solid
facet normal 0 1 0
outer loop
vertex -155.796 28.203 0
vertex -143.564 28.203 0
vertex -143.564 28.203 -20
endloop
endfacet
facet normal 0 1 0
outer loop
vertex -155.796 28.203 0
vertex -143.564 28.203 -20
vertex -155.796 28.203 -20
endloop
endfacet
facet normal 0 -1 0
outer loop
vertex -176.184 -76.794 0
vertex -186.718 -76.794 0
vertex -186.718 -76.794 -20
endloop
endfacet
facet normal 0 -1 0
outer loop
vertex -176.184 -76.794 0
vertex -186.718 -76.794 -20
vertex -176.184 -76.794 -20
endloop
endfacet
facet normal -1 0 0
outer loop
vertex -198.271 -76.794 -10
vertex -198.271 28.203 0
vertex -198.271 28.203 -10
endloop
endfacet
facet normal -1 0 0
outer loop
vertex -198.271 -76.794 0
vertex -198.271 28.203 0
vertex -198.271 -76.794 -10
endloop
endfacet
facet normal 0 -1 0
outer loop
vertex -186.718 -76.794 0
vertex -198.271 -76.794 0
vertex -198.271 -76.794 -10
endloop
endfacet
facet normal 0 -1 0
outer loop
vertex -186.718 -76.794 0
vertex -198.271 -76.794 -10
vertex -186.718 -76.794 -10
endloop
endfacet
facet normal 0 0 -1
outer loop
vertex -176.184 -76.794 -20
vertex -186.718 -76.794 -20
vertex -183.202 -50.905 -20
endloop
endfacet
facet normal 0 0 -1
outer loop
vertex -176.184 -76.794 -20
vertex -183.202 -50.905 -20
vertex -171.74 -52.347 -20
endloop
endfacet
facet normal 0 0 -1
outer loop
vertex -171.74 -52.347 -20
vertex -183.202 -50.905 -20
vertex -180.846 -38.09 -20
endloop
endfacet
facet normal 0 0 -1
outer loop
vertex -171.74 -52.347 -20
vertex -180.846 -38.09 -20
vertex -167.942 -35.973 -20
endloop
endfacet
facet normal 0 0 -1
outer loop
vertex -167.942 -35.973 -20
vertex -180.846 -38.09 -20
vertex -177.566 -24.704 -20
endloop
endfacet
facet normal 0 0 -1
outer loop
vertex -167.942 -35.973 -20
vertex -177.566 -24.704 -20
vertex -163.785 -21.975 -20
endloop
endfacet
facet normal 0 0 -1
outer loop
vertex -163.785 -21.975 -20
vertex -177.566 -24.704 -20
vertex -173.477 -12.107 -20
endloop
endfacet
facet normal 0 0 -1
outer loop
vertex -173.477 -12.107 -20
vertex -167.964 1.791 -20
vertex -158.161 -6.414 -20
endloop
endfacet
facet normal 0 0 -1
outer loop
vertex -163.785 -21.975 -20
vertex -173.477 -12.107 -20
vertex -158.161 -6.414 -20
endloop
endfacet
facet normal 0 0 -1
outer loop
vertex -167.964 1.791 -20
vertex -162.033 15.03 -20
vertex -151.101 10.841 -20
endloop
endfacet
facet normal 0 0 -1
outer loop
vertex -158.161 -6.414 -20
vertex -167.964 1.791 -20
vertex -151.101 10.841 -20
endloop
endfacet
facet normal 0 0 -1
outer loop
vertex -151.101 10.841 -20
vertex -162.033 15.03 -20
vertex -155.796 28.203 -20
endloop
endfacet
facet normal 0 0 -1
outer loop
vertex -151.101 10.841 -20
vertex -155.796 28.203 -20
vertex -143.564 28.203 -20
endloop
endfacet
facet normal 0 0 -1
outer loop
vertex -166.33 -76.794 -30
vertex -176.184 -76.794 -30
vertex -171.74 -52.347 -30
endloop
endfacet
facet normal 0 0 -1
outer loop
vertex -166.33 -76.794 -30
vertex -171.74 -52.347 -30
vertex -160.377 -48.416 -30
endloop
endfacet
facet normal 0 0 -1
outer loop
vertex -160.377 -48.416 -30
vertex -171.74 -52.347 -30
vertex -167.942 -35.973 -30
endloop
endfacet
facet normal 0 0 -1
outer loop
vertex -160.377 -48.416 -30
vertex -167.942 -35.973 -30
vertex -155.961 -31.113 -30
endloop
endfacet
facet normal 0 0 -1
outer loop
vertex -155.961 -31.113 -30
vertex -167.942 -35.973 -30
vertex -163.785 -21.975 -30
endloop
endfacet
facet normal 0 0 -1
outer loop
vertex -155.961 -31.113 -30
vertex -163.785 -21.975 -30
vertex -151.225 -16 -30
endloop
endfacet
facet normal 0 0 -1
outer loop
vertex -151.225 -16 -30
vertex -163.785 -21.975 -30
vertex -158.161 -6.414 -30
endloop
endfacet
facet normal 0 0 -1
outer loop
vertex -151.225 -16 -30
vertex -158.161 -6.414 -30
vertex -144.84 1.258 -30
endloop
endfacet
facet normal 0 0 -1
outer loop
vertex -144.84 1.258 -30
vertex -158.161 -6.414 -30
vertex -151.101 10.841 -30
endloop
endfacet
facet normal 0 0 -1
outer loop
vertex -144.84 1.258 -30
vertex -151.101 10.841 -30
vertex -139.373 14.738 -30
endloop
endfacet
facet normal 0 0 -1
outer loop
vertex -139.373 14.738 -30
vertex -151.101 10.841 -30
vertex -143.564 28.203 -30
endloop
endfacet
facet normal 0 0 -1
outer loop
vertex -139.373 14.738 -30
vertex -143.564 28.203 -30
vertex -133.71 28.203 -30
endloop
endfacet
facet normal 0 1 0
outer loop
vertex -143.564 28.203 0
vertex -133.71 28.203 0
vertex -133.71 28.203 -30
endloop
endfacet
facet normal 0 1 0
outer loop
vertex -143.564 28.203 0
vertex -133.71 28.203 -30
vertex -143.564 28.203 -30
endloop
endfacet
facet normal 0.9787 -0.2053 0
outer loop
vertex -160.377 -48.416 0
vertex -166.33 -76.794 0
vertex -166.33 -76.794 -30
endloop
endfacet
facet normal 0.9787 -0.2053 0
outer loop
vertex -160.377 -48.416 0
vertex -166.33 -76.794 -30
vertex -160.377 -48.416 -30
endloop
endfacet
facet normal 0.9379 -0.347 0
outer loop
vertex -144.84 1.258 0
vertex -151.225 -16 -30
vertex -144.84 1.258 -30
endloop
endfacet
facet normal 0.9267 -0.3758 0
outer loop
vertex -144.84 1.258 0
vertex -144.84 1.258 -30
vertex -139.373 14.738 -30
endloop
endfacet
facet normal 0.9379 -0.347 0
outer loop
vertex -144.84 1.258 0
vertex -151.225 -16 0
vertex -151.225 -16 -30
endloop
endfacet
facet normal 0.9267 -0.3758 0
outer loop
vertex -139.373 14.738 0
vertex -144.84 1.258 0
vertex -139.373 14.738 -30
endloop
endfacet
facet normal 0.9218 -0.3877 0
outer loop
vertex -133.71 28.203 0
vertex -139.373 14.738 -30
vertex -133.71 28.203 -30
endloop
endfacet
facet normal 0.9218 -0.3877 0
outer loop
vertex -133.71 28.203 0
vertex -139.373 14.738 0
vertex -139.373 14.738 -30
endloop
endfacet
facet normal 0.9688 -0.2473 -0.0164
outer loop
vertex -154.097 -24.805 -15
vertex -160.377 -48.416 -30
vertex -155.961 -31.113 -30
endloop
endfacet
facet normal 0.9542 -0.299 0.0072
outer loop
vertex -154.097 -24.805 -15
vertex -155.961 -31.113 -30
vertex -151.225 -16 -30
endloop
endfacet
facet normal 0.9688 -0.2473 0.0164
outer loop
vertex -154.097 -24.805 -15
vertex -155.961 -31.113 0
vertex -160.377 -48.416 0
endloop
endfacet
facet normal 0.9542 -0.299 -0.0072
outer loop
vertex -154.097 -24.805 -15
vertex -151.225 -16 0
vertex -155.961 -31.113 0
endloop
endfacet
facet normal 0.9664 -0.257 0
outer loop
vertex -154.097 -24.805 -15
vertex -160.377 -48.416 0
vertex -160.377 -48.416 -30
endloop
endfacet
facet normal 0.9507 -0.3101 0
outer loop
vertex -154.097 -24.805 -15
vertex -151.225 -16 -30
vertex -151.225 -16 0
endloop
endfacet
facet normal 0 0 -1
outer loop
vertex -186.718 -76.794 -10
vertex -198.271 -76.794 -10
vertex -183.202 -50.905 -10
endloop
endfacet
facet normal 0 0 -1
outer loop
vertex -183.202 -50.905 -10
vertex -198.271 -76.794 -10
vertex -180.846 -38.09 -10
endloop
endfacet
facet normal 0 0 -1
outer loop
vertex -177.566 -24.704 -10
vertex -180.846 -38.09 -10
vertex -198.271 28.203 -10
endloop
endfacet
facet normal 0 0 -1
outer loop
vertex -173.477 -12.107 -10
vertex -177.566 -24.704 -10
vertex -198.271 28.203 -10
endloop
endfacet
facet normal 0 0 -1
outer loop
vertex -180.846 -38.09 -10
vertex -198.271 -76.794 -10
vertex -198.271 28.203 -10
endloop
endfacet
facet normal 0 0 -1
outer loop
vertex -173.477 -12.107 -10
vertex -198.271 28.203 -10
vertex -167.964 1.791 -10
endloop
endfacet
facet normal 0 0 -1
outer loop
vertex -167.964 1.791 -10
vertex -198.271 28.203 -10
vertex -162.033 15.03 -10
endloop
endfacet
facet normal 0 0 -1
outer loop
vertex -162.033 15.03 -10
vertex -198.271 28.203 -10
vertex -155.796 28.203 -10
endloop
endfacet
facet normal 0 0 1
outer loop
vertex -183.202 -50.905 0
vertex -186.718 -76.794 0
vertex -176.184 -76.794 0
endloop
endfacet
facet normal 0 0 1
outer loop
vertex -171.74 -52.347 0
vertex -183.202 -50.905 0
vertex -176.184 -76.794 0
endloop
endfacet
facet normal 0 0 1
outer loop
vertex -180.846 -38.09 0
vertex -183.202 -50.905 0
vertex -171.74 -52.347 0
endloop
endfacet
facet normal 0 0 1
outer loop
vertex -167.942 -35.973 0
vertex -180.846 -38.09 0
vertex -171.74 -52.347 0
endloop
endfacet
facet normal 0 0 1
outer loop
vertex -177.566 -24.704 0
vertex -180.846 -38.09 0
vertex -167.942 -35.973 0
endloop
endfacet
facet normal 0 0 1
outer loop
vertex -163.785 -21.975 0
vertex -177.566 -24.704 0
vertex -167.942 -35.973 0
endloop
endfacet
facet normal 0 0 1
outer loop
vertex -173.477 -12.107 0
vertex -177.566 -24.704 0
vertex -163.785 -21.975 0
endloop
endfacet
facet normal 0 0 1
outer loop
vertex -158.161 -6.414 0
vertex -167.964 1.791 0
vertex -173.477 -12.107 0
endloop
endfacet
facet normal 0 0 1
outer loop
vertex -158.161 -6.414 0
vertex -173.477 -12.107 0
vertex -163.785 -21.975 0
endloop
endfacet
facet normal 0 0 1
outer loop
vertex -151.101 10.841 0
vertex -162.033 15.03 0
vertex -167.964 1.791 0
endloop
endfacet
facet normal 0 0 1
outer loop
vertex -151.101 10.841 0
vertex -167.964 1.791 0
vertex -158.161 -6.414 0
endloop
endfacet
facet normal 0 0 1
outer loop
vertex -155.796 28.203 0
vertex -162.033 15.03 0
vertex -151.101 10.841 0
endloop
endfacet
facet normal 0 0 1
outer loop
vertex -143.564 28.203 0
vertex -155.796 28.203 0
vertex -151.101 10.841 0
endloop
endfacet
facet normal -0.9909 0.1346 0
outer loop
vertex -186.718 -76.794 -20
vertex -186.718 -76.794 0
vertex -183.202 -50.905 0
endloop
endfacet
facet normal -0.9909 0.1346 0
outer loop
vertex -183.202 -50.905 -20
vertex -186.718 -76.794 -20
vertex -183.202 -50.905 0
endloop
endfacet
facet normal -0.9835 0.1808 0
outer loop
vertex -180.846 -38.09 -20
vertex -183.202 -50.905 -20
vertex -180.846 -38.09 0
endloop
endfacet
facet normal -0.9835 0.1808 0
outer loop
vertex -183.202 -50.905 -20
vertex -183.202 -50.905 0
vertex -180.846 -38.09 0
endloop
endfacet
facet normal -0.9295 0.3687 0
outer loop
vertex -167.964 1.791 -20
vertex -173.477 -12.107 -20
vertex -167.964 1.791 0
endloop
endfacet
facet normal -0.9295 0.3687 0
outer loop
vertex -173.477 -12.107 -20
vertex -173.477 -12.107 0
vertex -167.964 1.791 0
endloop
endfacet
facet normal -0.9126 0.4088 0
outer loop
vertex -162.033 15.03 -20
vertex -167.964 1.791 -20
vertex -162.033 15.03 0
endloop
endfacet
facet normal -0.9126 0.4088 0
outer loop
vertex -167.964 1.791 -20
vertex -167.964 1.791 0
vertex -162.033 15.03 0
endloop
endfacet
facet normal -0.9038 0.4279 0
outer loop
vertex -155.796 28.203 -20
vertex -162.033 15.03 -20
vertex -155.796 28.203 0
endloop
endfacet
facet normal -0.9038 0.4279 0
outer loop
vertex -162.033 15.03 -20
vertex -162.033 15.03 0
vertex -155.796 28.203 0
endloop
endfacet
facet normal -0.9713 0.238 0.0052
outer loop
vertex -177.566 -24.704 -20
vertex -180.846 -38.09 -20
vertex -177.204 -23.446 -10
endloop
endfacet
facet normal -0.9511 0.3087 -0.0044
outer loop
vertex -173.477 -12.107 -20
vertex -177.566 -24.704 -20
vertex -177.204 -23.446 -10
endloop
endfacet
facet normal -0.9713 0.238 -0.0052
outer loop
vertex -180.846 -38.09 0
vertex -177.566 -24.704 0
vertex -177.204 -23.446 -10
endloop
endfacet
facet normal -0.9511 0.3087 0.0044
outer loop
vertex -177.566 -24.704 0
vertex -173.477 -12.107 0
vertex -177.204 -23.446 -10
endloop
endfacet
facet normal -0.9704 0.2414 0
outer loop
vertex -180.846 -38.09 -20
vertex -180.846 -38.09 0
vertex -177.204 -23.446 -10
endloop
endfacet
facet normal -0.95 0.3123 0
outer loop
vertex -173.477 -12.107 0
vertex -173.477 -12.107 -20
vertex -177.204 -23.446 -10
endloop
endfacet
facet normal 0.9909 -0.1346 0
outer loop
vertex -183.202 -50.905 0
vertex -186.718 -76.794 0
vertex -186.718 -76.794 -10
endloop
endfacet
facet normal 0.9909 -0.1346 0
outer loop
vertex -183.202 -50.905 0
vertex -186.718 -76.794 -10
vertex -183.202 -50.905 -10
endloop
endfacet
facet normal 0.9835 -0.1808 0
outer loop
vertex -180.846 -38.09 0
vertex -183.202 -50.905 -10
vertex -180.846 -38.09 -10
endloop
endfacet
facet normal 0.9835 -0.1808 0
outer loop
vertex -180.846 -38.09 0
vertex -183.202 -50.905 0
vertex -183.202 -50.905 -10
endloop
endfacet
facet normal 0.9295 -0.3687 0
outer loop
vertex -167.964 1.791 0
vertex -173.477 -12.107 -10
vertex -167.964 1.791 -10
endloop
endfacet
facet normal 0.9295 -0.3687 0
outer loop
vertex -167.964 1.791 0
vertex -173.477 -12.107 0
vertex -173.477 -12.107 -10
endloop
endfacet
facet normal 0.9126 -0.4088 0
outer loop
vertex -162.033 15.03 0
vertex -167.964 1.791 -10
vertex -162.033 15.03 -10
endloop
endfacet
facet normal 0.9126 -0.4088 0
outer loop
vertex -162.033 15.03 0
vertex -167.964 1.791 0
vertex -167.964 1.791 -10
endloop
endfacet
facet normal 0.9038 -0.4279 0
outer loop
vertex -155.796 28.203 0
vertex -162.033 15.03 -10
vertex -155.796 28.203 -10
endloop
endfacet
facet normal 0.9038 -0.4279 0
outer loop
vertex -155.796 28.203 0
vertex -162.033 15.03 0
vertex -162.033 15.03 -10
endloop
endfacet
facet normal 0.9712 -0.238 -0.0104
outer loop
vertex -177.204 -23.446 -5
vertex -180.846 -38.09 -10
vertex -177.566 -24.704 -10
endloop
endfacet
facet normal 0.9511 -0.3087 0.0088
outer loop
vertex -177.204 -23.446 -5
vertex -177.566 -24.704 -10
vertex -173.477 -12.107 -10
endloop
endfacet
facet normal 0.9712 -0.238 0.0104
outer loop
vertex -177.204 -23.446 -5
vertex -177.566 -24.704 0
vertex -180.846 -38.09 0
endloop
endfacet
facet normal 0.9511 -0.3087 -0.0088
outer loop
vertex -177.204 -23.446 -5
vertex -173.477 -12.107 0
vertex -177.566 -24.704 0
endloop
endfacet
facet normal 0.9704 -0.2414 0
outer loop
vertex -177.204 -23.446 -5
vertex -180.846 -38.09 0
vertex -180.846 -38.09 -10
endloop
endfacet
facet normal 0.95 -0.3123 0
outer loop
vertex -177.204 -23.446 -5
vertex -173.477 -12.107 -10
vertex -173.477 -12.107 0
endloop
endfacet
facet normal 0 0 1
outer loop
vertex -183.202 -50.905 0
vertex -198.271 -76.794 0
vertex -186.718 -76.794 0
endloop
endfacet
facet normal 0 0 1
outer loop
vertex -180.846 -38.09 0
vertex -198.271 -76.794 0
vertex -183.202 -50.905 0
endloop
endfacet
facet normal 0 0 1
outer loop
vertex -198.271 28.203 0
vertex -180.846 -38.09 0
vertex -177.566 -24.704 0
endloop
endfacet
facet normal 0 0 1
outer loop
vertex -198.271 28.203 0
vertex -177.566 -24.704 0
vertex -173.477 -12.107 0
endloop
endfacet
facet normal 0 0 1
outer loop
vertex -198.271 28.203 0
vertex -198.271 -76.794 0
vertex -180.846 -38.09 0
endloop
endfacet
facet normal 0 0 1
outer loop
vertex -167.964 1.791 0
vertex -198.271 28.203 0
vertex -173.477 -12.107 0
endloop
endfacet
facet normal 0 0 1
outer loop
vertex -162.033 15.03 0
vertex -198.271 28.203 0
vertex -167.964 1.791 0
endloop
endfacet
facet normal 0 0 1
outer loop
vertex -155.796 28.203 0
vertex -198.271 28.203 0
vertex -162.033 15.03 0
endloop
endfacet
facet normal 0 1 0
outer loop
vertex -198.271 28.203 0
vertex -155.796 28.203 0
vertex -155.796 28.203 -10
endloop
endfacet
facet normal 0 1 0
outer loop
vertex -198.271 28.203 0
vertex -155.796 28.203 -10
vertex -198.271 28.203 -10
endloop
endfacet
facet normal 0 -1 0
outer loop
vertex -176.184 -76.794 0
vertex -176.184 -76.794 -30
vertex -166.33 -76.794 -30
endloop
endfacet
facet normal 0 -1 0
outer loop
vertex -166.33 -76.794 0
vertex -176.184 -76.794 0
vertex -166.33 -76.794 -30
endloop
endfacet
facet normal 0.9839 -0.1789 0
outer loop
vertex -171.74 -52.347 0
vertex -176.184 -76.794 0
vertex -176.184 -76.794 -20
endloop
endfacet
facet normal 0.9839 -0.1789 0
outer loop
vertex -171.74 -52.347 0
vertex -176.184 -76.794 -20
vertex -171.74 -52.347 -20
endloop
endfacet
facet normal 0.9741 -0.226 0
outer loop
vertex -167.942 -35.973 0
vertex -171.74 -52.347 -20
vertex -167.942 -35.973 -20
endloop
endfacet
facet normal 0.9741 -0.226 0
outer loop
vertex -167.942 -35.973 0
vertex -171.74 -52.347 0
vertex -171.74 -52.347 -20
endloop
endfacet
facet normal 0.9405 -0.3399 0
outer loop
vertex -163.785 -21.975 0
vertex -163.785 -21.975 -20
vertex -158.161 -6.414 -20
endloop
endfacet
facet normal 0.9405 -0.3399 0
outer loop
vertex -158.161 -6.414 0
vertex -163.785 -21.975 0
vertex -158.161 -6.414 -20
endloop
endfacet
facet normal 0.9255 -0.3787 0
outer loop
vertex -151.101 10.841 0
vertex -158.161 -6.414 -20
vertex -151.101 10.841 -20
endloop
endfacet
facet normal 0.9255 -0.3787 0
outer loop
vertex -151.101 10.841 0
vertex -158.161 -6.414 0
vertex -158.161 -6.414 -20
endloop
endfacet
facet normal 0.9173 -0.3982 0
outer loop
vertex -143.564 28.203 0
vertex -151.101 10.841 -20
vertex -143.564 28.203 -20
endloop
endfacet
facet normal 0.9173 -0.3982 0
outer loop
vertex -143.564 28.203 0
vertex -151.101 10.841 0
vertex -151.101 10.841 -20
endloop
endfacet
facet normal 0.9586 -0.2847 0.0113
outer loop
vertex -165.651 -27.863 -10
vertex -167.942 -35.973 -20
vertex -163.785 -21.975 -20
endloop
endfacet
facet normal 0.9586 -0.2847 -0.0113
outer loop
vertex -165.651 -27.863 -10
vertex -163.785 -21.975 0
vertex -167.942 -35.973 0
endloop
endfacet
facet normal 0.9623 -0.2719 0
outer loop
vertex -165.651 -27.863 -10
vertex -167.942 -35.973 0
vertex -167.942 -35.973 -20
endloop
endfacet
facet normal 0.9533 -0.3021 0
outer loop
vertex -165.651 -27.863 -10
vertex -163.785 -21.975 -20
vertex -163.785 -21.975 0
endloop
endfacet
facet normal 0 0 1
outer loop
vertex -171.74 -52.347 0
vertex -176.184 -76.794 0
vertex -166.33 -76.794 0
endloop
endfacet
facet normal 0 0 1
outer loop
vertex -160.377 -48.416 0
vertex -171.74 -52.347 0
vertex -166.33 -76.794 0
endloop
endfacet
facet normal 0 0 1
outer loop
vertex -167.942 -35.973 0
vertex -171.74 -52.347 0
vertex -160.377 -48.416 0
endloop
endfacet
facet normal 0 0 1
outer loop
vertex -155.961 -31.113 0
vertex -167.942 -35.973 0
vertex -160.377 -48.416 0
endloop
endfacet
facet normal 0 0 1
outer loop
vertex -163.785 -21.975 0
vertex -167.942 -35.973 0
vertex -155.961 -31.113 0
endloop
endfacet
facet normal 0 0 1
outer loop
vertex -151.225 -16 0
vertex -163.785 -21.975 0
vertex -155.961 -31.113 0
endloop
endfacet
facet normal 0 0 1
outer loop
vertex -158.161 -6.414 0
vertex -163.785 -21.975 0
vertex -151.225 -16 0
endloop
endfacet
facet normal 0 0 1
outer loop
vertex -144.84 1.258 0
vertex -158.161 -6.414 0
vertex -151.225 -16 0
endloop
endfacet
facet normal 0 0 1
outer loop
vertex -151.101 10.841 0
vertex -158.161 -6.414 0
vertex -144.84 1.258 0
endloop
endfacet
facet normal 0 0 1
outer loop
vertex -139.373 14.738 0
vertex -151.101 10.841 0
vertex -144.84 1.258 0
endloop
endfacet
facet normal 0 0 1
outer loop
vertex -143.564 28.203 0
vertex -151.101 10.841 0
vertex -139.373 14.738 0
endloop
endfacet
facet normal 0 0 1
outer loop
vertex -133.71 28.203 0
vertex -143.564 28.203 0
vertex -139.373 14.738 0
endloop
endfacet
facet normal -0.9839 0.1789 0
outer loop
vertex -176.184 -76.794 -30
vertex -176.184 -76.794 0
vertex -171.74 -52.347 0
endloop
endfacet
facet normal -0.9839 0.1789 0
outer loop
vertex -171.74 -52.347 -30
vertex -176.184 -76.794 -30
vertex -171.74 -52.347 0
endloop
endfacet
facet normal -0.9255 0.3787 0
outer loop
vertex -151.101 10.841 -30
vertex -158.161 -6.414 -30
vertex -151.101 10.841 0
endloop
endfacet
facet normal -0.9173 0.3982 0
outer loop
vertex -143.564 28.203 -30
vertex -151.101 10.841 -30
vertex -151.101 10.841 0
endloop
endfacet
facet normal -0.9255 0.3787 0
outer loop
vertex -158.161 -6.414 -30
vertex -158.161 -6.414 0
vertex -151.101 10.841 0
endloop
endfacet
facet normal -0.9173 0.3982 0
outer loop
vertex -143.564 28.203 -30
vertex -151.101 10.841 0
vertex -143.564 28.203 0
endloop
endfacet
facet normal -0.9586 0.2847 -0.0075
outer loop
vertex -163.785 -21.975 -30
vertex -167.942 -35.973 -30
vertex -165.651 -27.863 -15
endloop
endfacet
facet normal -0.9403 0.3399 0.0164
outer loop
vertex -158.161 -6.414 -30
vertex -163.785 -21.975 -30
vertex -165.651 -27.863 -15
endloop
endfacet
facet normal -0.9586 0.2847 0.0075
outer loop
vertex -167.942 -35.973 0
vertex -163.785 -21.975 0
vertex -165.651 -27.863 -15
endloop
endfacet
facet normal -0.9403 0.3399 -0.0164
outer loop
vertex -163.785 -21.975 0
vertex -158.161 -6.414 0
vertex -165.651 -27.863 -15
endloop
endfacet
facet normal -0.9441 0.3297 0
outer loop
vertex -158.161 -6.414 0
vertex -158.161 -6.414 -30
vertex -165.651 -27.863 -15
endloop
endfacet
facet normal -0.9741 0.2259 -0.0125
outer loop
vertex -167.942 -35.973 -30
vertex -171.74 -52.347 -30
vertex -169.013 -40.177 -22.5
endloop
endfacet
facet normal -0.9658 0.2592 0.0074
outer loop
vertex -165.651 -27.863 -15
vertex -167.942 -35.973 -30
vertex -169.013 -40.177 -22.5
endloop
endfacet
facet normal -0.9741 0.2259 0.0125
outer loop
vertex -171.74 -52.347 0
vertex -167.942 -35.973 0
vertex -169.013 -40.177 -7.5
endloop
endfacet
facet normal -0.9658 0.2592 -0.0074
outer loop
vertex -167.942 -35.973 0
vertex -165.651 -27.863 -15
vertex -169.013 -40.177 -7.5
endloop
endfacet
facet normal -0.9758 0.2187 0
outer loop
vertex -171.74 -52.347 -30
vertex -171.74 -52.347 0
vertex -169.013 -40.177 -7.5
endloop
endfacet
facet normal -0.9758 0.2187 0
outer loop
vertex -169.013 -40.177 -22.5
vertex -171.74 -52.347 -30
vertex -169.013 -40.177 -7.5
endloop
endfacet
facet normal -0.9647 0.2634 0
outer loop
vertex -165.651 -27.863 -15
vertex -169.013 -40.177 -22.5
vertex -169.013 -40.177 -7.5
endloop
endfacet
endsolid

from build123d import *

# Parameters (mm, degrees)
F1_DEPTH = 10
F2_DEPTH = 20
F3_DEPTH = 30


with BuildPart() as f1:
    # F0 (on Top) → F1 (new body)
    with BuildSketch(Plane.XY):
        with BuildLine():
            Line((-155.7964533567, 28.2030683011), (-198.2709467411, 28.2030683011))
            Line((-198.2709467411, 28.2030683011), (-198.2709467411, -76.7938867211))
            Line((-198.2709467411, -76.7938867211), (-186.7178976536, -76.7938867211))
            add(Edge.make_bspline(
                [(-186.7178976536, -76.7938867211), (-184.5023630807, -58.8045595065), (-180.0364101654, -22.5426616764), (-163.9184051264, 11.1999698777), (-155.7964533567, 28.2030683011)],
                knots=[0, 0, 0, 0, 0.4960944763, 1, 1, 1, 1], degree=3))
        make_face()
    extrude(amount=-F1_DEPTH)


with BuildPart() as f2:
    # F0 (on Top) → F2 (new body)
    with BuildSketch(Plane.XY):
        with BuildLine():
            Line((-143.5638070107, 28.2030683011), (-155.7964533567, 28.2030683011))
            add(Edge.make_bspline(
                [(-186.7178976536, -76.7938867211), (-184.5023630807, -58.8045595065), (-180.0364101654, -22.5426616764), (-163.9184051264, 11.1999698777), (-155.7964533567, 28.2030683011)],
                knots=[0, 0, 0, 0, 0.4960944763, 1, 1, 1, 1], degree=3))
            Line((-186.7178976536, -76.7938867211), (-176.184207201, -76.7938867211))
            add(Edge.make_bspline(
                [(-176.184207201, -76.7938867211), (-173.4355359871, -60.6558550722), (-167.6708875572, -26.8103815443), (-151.8441287787, 9.3069989322), (-143.5638070107, 28.2030683011)],
                knots=[0, 0, 0, 0, 0.4768150647, 1, 1, 1, 1], degree=3))
        make_face()
    extrude(amount=-F2_DEPTH)


with BuildPart() as f3:
    # F0 (on Top) → F3 (new body)
    with BuildSketch(Plane.XY):
        with BuildLine():
            Line((-133.7097138166, 28.2030683011), (-143.5638070107, 28.2030683011))
            add(Edge.make_bspline(
                [(-176.184207201, -76.7938867211), (-173.4355359871, -60.6558550722), (-167.6708875572, -26.8103815443), (-151.8441287787, 9.3069989322), (-143.5638070107, 28.2030683011)],
                knots=[0, 0, 0, 0, 0.4768150647, 1, 1, 1, 1], degree=3))
            Line((-176.184207201, -76.7938867211), (-166.3301289082, -76.7938867211))
            add(Edge.make_bspline(
                [(-166.3301289082, -76.7938867211), (-162.8711040579, -59.4163198767), (-155.8451169004, -24.1189263154), (-141.1633648246, 10.584690789), (-133.7097138166, 28.2030683011)],
                knots=[0, 0, 0, 0, 0.4923186981, 1, 1, 1, 1], degree=3))
        make_face()
    extrude(amount=-F3_DEPTH)


solid = Compound([f1.part, f2.part, f3.part])
